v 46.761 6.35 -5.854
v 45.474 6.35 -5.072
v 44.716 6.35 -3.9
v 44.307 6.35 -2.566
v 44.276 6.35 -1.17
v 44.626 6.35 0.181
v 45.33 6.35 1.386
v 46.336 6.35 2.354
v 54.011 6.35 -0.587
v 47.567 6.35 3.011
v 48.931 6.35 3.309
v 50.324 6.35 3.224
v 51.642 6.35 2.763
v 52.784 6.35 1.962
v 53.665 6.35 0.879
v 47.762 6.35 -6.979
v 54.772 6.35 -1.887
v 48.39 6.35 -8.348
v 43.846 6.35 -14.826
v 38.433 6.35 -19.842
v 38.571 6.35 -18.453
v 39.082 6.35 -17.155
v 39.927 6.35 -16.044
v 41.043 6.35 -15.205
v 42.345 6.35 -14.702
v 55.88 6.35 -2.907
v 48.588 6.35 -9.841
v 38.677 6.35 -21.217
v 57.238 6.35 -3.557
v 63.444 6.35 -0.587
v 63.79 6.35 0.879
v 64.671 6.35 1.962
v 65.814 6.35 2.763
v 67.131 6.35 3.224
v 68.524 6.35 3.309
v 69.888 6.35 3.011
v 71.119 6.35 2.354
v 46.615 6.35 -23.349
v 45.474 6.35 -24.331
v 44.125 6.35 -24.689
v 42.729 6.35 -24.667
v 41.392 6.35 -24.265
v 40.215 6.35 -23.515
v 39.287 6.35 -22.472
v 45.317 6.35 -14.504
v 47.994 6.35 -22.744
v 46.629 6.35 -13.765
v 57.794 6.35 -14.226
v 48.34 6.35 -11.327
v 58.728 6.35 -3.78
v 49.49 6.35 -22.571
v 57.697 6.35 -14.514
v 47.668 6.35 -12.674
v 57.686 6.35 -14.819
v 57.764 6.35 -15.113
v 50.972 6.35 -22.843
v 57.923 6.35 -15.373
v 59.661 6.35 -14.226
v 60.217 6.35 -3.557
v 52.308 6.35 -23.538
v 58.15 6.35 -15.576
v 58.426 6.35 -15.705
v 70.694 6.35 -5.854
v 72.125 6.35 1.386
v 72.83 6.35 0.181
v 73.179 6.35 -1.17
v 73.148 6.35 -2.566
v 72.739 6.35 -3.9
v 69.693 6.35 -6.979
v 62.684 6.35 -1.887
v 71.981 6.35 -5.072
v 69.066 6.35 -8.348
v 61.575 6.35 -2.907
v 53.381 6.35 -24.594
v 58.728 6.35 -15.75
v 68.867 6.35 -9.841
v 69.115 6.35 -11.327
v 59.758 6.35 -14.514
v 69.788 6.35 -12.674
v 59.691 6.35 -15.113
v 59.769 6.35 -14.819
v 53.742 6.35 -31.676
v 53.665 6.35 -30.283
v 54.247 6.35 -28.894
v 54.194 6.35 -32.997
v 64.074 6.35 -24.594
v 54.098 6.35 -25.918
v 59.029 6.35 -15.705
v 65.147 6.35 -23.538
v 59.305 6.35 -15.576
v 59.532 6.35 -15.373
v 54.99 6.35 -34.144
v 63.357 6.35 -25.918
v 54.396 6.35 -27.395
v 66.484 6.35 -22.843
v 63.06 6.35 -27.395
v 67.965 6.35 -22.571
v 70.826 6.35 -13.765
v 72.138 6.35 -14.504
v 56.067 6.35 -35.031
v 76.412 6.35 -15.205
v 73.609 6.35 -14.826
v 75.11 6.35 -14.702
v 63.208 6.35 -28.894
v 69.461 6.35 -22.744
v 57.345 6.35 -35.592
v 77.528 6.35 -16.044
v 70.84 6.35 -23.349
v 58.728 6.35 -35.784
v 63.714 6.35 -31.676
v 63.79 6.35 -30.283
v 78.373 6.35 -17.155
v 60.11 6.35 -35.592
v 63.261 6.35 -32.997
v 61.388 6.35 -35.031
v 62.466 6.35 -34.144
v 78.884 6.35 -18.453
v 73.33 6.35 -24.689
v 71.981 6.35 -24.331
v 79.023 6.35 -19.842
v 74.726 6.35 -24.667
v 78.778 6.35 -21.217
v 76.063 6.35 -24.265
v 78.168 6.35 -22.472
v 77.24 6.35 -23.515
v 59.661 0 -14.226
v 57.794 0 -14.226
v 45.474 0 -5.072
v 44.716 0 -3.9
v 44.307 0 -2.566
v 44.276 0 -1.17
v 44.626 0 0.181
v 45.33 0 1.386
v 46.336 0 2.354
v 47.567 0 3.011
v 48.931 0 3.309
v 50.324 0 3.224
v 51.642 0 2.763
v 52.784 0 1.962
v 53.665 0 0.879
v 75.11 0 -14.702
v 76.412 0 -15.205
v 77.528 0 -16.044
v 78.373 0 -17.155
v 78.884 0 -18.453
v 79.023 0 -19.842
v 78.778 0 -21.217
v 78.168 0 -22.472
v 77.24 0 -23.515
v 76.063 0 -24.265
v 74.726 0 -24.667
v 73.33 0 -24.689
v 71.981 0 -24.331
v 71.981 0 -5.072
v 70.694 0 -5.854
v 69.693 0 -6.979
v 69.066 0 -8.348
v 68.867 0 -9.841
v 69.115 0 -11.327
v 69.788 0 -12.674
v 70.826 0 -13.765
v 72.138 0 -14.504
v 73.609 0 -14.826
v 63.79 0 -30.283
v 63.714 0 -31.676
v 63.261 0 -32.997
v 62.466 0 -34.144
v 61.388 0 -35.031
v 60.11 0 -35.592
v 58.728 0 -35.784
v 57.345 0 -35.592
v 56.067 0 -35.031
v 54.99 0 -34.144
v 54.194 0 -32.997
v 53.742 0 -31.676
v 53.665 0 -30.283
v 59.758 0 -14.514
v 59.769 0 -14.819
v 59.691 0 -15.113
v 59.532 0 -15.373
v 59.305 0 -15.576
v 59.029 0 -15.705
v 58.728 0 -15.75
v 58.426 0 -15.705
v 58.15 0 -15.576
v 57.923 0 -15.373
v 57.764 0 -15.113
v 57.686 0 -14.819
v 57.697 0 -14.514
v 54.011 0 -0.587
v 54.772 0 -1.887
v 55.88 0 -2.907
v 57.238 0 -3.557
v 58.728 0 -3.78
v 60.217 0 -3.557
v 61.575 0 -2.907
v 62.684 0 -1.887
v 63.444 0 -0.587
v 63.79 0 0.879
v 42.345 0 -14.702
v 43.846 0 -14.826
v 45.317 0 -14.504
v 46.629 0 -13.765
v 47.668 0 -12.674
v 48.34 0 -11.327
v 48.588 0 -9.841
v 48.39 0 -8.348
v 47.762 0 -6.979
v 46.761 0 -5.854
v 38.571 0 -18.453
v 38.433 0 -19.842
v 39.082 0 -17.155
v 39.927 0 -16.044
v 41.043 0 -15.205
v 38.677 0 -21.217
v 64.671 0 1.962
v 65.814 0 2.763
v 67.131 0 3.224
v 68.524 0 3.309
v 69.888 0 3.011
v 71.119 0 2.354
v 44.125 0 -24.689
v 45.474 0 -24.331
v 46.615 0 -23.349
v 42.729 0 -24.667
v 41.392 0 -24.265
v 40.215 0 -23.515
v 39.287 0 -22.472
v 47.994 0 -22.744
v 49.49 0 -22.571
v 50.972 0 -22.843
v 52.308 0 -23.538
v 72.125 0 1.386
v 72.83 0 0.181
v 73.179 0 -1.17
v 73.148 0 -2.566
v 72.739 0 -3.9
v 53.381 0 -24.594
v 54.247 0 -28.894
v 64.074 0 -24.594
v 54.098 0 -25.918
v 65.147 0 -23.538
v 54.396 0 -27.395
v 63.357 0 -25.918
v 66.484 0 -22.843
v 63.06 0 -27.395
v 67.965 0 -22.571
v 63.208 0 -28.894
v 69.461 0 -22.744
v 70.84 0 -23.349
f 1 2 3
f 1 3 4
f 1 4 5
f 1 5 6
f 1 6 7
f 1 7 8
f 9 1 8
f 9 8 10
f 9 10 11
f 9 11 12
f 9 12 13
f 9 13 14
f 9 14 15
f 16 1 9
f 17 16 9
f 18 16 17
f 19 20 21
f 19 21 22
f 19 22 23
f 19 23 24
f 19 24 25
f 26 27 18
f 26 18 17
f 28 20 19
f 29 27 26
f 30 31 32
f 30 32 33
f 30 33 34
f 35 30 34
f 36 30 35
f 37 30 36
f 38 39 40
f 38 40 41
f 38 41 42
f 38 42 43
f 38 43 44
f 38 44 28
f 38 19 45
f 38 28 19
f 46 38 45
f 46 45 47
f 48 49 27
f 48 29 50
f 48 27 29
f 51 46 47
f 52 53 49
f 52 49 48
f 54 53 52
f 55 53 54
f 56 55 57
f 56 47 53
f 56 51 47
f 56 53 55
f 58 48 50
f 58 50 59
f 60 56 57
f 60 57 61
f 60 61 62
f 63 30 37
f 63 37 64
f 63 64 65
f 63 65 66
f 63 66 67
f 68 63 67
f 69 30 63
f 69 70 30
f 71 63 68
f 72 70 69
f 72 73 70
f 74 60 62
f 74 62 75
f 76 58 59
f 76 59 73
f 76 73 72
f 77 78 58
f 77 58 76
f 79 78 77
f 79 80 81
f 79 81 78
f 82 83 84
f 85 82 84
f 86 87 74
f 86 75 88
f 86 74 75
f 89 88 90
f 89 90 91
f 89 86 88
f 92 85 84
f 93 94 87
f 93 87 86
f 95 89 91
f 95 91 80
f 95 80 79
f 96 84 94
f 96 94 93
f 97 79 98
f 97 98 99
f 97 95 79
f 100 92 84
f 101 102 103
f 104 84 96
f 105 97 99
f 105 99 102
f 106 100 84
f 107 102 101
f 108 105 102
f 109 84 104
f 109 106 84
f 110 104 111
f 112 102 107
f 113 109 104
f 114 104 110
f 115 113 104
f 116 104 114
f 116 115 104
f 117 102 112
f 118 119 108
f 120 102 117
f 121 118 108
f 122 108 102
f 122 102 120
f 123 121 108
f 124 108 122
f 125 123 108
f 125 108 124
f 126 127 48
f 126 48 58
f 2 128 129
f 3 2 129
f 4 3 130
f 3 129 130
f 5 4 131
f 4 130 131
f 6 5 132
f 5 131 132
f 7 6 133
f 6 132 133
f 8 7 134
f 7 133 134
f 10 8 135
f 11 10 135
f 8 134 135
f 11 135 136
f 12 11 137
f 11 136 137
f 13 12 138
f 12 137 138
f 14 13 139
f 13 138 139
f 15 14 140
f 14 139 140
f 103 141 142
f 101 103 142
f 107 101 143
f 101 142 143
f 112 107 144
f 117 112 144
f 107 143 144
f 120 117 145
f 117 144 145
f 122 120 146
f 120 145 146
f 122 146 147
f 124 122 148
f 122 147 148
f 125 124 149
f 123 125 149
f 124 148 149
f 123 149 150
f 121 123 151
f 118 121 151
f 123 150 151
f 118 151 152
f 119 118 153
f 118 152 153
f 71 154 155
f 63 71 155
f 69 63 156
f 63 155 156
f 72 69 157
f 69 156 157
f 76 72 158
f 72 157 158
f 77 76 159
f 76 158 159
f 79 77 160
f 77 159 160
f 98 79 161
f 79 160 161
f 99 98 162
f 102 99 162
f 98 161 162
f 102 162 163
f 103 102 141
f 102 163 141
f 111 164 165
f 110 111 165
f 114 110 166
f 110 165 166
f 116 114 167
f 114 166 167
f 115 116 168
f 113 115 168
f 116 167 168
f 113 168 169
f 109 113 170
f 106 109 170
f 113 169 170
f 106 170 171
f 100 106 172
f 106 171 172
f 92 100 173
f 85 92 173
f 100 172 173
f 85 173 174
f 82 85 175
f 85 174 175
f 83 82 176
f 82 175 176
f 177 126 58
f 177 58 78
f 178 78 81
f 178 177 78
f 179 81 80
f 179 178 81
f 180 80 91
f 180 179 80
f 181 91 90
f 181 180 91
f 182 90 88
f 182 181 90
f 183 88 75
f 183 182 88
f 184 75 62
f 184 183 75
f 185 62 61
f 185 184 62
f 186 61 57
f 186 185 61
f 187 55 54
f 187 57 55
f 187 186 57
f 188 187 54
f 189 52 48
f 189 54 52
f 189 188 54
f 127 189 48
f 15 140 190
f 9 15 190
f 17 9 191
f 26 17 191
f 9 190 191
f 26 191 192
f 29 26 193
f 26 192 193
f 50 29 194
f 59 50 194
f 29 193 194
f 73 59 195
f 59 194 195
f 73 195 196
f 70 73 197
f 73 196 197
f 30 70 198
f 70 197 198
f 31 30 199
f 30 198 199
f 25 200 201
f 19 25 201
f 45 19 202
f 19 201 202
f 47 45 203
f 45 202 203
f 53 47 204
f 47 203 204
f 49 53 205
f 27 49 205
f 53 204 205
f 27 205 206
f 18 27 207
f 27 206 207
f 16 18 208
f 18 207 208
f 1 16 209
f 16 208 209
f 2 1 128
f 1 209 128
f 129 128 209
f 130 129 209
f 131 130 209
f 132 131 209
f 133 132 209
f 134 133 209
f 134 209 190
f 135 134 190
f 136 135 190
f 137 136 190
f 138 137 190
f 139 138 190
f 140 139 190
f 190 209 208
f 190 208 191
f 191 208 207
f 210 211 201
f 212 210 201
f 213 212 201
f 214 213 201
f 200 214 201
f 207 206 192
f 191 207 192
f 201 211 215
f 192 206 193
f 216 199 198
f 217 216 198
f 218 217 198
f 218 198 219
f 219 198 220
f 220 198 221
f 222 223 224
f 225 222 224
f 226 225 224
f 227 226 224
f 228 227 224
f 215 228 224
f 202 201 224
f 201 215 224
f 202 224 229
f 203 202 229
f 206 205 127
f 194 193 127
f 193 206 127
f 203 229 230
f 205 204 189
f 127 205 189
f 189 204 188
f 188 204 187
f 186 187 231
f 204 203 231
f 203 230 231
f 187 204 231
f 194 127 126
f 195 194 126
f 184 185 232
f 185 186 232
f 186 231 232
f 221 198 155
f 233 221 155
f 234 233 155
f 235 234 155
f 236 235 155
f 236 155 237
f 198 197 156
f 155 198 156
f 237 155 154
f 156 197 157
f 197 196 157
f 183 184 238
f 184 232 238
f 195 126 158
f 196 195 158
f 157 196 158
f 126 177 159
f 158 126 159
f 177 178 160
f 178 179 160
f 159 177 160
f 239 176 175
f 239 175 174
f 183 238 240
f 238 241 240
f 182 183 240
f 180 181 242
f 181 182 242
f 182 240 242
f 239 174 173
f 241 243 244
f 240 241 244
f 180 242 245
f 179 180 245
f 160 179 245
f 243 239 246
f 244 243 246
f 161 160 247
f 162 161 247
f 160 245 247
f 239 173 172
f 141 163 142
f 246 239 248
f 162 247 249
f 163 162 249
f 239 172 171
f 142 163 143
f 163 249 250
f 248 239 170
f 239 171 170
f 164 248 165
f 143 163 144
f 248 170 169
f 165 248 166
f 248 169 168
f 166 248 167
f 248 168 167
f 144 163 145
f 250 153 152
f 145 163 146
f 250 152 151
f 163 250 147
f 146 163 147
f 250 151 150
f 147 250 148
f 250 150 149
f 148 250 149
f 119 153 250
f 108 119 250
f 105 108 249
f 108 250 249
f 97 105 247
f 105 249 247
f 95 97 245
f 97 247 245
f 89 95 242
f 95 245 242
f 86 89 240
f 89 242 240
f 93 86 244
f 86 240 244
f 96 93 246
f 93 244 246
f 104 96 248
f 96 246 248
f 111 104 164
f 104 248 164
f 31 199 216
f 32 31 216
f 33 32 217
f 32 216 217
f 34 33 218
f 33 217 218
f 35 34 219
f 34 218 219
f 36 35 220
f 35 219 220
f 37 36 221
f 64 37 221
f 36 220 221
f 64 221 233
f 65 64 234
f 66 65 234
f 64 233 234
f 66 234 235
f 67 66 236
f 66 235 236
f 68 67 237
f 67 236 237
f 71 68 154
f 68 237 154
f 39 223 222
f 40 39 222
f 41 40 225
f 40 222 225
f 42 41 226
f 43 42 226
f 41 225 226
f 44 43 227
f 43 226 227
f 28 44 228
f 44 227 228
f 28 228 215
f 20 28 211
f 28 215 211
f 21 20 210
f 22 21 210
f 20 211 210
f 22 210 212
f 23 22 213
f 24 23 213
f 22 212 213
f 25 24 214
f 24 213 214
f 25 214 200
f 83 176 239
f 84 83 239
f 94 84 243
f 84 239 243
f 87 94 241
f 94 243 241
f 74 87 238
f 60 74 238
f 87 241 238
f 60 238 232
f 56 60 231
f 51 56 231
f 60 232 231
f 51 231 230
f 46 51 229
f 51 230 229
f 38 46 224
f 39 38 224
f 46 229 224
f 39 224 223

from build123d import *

# Parameters (mm, degrees)
BOSS_EXTRUDE1_DEPTH = 6.35
CUT_EXTRUDE1_DEPTH  = 87.982615074


with BuildPart() as part:
    # Sketch5 → Boss-Extrude1 (new body)
    with BuildSketch(Plane(origin=(0, 0, 0), x_dir=(1, 0, 0), z_dir=(0, 1, 0))):
        with BuildLine():
            ThreePointArc((63.790074828, 30.282665757), (58.727566665, 35.783867727), (53.665058502, 30.282665757))
            ThreePointArc((53.665058502, 30.282665757), (52.307776139, 23.537951339), (45.473748225, 24.331330481))
            ThreePointArc((45.473748225, 24.331330481), (38.677393188, 21.216564002), (42.344946112, 14.701867727))
            ThreePointArc((42.344946112, 14.701867727), (48.340127394, 11.326784114), (45.473748225, 5.072404972))
            ThreePointArc((45.473748225, 5.072404972), (46.335877976, -2.353828549), (53.665058502, -0.878930303))
            ThreePointArc((53.665058502, -0.878930303), (58.727566665, 3.779867727), (63.790074828, -0.878930303))
            ThreePointArc((63.790074828, -0.878930303), (71.119255353, -2.353828549), (71.981385104, 5.072404972))
            ThreePointArc((71.981385104, 5.072404972), (69.115005936, 11.326784114), (75.110187217, 14.701867727))
            ThreePointArc((75.110187217, 14.701867727), (78.777740141, 21.216564002), (71.981385104, 24.331330481))
            ThreePointArc((71.981385104, 24.331330481), (65.14735719, 23.537951339), (63.790074828, 30.282665757))
        make_face()
    extrude(amount=BOSS_EXTRUDE1_DEPTH)

    # Sketch6 → Cut-Extrude1 (cut, through all)
    with BuildSketch(Plane(origin=(0, 0, 0), x_dir=(1, 0, 0), z_dir=(0, 1, 0))):
        with BuildLine():
            Line((57.794311073, 14.225617727), (59.660822257, 14.225617727))
            ThreePointArc((59.660822257, 14.225617727), (58.727566665, 15.749617727), (57.794311073, 14.225617727))
        make_face()
    extrude(amount=CUT_EXTRUDE1_DEPTH, mode=Mode.SUBTRACT)


solid = part.part
